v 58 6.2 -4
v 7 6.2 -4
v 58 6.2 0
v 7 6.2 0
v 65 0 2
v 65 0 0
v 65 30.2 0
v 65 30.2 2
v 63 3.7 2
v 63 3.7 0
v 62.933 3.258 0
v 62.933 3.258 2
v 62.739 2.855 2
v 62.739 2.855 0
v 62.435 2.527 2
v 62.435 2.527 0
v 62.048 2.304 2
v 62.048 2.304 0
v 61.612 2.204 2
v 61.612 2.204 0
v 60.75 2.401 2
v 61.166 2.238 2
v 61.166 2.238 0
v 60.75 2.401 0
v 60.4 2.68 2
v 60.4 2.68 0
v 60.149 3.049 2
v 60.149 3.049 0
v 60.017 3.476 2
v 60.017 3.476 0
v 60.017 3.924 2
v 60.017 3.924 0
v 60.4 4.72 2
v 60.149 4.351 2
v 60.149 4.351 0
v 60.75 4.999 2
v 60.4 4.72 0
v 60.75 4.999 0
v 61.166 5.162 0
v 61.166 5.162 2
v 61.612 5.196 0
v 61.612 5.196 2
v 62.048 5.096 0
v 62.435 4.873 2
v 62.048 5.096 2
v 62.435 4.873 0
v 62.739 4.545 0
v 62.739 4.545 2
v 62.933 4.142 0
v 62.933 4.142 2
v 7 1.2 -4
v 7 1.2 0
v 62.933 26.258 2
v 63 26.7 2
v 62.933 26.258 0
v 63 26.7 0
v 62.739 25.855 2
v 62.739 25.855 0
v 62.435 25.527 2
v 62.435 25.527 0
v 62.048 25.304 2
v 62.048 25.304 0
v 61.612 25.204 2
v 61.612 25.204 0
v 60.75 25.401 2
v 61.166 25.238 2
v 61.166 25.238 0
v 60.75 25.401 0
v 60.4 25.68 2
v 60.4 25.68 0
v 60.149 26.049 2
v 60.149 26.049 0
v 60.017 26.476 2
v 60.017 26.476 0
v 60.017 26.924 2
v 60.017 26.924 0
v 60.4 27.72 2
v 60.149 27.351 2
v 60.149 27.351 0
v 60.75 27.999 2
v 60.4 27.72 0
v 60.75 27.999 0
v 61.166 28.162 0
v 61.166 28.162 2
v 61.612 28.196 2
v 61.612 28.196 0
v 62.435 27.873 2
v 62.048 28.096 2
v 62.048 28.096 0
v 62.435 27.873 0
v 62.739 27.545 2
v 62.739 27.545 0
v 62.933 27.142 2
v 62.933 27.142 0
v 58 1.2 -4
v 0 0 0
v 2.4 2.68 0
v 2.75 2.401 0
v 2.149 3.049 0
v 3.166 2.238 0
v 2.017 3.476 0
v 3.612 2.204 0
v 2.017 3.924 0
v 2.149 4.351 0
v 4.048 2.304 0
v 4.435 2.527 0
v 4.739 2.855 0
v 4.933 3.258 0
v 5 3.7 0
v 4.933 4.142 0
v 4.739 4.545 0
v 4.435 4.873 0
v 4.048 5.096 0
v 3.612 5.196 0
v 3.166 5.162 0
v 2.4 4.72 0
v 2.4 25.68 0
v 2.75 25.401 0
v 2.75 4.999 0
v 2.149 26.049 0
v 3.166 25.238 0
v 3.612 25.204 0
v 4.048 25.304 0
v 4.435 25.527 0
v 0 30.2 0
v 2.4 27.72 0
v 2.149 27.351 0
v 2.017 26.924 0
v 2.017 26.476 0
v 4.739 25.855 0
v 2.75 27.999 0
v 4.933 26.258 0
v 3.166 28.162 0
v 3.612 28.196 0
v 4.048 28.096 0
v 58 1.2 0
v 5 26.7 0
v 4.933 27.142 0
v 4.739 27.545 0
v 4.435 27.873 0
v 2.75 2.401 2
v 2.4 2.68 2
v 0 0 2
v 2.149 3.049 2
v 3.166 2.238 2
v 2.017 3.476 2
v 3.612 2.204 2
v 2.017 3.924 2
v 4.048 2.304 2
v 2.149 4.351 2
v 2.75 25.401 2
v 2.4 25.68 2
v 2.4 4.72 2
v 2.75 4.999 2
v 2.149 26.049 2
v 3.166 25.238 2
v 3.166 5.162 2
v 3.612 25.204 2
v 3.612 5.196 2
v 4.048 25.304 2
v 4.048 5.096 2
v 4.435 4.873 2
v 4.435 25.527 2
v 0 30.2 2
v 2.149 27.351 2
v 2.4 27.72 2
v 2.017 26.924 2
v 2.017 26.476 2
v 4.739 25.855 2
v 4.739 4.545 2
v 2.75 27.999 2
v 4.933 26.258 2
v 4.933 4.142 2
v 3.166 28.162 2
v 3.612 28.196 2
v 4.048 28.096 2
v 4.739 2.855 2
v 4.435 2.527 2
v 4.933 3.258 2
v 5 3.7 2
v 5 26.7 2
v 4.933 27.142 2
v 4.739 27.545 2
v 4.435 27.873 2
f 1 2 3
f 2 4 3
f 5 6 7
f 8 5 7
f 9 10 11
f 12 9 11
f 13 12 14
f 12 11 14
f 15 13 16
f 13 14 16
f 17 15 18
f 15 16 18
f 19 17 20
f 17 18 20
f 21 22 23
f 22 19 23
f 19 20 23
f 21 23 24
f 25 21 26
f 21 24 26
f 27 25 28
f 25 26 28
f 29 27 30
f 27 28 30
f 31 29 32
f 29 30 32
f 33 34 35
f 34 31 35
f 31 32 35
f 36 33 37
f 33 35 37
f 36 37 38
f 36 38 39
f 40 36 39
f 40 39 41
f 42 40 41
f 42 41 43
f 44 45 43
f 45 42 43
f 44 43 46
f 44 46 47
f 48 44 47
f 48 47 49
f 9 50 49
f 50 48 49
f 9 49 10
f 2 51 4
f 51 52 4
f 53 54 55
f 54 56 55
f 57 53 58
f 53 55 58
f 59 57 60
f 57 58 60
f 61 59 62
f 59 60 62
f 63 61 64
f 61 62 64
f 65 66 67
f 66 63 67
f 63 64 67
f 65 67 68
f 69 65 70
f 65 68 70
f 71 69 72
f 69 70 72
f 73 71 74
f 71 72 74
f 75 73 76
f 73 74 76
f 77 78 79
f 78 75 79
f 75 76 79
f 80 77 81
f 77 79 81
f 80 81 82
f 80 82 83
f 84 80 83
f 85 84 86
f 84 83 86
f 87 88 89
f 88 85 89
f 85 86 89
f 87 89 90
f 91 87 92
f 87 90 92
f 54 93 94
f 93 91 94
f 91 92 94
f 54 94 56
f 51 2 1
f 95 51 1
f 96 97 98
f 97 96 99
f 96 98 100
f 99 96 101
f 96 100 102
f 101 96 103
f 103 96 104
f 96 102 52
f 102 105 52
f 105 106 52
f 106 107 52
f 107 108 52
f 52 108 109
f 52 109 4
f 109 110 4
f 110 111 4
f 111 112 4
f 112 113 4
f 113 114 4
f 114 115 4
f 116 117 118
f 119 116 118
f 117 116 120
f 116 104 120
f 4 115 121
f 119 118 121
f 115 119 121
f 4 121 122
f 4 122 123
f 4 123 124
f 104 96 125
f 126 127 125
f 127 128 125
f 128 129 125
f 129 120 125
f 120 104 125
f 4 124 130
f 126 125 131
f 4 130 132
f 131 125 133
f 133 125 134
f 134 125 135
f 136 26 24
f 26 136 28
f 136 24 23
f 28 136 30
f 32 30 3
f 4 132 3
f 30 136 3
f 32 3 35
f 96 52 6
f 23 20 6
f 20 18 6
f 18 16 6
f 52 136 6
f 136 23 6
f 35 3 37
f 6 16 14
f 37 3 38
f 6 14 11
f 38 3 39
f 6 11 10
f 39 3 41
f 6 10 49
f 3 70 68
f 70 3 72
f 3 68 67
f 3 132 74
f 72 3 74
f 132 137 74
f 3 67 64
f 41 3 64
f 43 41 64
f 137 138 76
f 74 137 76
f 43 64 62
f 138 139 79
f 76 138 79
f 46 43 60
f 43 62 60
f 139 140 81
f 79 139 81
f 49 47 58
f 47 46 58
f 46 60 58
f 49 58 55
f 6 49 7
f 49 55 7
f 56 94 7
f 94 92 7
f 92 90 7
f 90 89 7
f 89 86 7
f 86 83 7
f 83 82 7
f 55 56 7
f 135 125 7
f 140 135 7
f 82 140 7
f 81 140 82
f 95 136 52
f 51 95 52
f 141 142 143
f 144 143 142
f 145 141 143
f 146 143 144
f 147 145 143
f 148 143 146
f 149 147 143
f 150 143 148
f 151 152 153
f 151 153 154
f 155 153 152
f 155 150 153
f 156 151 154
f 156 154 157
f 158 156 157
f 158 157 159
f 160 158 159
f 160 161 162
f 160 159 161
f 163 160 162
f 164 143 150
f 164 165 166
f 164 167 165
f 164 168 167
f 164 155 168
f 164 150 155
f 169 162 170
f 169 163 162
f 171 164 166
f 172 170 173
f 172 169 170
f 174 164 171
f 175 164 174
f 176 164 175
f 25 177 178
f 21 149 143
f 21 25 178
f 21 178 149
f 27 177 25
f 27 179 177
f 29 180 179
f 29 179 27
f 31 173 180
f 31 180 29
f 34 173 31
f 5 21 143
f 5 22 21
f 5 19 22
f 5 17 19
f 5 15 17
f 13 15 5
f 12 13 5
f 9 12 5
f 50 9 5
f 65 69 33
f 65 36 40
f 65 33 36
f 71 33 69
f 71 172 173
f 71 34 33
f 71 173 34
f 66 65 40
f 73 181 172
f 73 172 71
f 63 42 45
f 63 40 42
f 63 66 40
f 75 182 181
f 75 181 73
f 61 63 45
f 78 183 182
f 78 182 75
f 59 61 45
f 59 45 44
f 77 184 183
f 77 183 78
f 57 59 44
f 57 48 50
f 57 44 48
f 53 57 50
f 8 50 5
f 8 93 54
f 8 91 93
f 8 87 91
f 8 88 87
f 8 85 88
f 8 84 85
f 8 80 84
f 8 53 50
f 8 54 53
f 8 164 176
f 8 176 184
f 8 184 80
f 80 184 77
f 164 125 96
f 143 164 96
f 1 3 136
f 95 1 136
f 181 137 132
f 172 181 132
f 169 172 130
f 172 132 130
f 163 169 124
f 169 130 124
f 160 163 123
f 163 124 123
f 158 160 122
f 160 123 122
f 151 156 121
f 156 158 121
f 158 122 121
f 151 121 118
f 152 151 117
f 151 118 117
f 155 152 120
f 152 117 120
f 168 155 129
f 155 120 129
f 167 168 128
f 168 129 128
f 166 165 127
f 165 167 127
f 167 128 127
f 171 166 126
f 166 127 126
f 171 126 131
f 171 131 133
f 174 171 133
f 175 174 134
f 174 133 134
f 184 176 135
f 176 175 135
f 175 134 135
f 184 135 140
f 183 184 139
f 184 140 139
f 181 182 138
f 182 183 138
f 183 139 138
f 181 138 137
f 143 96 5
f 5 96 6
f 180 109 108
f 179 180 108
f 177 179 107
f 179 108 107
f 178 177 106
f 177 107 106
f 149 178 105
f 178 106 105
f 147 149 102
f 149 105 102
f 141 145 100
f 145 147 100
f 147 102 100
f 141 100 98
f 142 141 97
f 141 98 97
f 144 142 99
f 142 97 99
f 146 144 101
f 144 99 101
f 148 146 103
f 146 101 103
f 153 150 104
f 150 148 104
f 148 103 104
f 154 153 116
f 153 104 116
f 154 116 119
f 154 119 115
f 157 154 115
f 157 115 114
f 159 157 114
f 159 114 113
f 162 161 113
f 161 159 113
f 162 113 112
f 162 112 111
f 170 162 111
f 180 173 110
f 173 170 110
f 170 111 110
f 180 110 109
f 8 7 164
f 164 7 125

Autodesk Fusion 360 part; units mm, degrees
sketch "Sketch1" plane through (0, 0, 0) normal (0, 0, 1) x (1, 0, 0)
  line L0 (0, 0) -> (65, 0)
  line L1 (65, 0) -> (65, 30.2)
  line L2 (65, 30.2) -> (0, 30.2)
  line L3 (0, 30.2) -> (0, 0)
  line L4 (32.5, 30.2) -> (32.5, 0)
  line L5 (65, 15.1) -> (0, 15.1)
  circle A0 centre (3.5, 26.7) radius 1.5
  circle A1 centre (61.5, 26.7) radius 1.5
  circle A2 centre (3.5, 3.7) radius 1.5
  circle A3 centre (61.5, 3.7) radius 1.5
  line L6 (7, 6.2) -> (58, 6.2)
  line L7 (58, 6.2) -> (58, 1.2)
  line L8 (58, 1.2) -> (7, 1.2)
  line L9 (7, 1.2) -> (7, 6.2)
  dimension "d1" = 65
  dimension "d2" = 30.2
  dimension "d3" = 3
  dimension "d4" = 3.5
  dimension "d5" = 3.5
  dimension "d6" = 3
  dimension "d7" = 3.5
  dimension "d8" = 3.7
  dimension "d11" = 51
  dimension "d12" = 5
  dimension "d14" = 1.2
extrude "Extrude1" add sketch "Sketch1" along normal blind 2
extrude "Extrude2" add sketch "Sketch1" against normal blind 4 contours L4 L6 L8 L9 | L4 L6 L7 L8
